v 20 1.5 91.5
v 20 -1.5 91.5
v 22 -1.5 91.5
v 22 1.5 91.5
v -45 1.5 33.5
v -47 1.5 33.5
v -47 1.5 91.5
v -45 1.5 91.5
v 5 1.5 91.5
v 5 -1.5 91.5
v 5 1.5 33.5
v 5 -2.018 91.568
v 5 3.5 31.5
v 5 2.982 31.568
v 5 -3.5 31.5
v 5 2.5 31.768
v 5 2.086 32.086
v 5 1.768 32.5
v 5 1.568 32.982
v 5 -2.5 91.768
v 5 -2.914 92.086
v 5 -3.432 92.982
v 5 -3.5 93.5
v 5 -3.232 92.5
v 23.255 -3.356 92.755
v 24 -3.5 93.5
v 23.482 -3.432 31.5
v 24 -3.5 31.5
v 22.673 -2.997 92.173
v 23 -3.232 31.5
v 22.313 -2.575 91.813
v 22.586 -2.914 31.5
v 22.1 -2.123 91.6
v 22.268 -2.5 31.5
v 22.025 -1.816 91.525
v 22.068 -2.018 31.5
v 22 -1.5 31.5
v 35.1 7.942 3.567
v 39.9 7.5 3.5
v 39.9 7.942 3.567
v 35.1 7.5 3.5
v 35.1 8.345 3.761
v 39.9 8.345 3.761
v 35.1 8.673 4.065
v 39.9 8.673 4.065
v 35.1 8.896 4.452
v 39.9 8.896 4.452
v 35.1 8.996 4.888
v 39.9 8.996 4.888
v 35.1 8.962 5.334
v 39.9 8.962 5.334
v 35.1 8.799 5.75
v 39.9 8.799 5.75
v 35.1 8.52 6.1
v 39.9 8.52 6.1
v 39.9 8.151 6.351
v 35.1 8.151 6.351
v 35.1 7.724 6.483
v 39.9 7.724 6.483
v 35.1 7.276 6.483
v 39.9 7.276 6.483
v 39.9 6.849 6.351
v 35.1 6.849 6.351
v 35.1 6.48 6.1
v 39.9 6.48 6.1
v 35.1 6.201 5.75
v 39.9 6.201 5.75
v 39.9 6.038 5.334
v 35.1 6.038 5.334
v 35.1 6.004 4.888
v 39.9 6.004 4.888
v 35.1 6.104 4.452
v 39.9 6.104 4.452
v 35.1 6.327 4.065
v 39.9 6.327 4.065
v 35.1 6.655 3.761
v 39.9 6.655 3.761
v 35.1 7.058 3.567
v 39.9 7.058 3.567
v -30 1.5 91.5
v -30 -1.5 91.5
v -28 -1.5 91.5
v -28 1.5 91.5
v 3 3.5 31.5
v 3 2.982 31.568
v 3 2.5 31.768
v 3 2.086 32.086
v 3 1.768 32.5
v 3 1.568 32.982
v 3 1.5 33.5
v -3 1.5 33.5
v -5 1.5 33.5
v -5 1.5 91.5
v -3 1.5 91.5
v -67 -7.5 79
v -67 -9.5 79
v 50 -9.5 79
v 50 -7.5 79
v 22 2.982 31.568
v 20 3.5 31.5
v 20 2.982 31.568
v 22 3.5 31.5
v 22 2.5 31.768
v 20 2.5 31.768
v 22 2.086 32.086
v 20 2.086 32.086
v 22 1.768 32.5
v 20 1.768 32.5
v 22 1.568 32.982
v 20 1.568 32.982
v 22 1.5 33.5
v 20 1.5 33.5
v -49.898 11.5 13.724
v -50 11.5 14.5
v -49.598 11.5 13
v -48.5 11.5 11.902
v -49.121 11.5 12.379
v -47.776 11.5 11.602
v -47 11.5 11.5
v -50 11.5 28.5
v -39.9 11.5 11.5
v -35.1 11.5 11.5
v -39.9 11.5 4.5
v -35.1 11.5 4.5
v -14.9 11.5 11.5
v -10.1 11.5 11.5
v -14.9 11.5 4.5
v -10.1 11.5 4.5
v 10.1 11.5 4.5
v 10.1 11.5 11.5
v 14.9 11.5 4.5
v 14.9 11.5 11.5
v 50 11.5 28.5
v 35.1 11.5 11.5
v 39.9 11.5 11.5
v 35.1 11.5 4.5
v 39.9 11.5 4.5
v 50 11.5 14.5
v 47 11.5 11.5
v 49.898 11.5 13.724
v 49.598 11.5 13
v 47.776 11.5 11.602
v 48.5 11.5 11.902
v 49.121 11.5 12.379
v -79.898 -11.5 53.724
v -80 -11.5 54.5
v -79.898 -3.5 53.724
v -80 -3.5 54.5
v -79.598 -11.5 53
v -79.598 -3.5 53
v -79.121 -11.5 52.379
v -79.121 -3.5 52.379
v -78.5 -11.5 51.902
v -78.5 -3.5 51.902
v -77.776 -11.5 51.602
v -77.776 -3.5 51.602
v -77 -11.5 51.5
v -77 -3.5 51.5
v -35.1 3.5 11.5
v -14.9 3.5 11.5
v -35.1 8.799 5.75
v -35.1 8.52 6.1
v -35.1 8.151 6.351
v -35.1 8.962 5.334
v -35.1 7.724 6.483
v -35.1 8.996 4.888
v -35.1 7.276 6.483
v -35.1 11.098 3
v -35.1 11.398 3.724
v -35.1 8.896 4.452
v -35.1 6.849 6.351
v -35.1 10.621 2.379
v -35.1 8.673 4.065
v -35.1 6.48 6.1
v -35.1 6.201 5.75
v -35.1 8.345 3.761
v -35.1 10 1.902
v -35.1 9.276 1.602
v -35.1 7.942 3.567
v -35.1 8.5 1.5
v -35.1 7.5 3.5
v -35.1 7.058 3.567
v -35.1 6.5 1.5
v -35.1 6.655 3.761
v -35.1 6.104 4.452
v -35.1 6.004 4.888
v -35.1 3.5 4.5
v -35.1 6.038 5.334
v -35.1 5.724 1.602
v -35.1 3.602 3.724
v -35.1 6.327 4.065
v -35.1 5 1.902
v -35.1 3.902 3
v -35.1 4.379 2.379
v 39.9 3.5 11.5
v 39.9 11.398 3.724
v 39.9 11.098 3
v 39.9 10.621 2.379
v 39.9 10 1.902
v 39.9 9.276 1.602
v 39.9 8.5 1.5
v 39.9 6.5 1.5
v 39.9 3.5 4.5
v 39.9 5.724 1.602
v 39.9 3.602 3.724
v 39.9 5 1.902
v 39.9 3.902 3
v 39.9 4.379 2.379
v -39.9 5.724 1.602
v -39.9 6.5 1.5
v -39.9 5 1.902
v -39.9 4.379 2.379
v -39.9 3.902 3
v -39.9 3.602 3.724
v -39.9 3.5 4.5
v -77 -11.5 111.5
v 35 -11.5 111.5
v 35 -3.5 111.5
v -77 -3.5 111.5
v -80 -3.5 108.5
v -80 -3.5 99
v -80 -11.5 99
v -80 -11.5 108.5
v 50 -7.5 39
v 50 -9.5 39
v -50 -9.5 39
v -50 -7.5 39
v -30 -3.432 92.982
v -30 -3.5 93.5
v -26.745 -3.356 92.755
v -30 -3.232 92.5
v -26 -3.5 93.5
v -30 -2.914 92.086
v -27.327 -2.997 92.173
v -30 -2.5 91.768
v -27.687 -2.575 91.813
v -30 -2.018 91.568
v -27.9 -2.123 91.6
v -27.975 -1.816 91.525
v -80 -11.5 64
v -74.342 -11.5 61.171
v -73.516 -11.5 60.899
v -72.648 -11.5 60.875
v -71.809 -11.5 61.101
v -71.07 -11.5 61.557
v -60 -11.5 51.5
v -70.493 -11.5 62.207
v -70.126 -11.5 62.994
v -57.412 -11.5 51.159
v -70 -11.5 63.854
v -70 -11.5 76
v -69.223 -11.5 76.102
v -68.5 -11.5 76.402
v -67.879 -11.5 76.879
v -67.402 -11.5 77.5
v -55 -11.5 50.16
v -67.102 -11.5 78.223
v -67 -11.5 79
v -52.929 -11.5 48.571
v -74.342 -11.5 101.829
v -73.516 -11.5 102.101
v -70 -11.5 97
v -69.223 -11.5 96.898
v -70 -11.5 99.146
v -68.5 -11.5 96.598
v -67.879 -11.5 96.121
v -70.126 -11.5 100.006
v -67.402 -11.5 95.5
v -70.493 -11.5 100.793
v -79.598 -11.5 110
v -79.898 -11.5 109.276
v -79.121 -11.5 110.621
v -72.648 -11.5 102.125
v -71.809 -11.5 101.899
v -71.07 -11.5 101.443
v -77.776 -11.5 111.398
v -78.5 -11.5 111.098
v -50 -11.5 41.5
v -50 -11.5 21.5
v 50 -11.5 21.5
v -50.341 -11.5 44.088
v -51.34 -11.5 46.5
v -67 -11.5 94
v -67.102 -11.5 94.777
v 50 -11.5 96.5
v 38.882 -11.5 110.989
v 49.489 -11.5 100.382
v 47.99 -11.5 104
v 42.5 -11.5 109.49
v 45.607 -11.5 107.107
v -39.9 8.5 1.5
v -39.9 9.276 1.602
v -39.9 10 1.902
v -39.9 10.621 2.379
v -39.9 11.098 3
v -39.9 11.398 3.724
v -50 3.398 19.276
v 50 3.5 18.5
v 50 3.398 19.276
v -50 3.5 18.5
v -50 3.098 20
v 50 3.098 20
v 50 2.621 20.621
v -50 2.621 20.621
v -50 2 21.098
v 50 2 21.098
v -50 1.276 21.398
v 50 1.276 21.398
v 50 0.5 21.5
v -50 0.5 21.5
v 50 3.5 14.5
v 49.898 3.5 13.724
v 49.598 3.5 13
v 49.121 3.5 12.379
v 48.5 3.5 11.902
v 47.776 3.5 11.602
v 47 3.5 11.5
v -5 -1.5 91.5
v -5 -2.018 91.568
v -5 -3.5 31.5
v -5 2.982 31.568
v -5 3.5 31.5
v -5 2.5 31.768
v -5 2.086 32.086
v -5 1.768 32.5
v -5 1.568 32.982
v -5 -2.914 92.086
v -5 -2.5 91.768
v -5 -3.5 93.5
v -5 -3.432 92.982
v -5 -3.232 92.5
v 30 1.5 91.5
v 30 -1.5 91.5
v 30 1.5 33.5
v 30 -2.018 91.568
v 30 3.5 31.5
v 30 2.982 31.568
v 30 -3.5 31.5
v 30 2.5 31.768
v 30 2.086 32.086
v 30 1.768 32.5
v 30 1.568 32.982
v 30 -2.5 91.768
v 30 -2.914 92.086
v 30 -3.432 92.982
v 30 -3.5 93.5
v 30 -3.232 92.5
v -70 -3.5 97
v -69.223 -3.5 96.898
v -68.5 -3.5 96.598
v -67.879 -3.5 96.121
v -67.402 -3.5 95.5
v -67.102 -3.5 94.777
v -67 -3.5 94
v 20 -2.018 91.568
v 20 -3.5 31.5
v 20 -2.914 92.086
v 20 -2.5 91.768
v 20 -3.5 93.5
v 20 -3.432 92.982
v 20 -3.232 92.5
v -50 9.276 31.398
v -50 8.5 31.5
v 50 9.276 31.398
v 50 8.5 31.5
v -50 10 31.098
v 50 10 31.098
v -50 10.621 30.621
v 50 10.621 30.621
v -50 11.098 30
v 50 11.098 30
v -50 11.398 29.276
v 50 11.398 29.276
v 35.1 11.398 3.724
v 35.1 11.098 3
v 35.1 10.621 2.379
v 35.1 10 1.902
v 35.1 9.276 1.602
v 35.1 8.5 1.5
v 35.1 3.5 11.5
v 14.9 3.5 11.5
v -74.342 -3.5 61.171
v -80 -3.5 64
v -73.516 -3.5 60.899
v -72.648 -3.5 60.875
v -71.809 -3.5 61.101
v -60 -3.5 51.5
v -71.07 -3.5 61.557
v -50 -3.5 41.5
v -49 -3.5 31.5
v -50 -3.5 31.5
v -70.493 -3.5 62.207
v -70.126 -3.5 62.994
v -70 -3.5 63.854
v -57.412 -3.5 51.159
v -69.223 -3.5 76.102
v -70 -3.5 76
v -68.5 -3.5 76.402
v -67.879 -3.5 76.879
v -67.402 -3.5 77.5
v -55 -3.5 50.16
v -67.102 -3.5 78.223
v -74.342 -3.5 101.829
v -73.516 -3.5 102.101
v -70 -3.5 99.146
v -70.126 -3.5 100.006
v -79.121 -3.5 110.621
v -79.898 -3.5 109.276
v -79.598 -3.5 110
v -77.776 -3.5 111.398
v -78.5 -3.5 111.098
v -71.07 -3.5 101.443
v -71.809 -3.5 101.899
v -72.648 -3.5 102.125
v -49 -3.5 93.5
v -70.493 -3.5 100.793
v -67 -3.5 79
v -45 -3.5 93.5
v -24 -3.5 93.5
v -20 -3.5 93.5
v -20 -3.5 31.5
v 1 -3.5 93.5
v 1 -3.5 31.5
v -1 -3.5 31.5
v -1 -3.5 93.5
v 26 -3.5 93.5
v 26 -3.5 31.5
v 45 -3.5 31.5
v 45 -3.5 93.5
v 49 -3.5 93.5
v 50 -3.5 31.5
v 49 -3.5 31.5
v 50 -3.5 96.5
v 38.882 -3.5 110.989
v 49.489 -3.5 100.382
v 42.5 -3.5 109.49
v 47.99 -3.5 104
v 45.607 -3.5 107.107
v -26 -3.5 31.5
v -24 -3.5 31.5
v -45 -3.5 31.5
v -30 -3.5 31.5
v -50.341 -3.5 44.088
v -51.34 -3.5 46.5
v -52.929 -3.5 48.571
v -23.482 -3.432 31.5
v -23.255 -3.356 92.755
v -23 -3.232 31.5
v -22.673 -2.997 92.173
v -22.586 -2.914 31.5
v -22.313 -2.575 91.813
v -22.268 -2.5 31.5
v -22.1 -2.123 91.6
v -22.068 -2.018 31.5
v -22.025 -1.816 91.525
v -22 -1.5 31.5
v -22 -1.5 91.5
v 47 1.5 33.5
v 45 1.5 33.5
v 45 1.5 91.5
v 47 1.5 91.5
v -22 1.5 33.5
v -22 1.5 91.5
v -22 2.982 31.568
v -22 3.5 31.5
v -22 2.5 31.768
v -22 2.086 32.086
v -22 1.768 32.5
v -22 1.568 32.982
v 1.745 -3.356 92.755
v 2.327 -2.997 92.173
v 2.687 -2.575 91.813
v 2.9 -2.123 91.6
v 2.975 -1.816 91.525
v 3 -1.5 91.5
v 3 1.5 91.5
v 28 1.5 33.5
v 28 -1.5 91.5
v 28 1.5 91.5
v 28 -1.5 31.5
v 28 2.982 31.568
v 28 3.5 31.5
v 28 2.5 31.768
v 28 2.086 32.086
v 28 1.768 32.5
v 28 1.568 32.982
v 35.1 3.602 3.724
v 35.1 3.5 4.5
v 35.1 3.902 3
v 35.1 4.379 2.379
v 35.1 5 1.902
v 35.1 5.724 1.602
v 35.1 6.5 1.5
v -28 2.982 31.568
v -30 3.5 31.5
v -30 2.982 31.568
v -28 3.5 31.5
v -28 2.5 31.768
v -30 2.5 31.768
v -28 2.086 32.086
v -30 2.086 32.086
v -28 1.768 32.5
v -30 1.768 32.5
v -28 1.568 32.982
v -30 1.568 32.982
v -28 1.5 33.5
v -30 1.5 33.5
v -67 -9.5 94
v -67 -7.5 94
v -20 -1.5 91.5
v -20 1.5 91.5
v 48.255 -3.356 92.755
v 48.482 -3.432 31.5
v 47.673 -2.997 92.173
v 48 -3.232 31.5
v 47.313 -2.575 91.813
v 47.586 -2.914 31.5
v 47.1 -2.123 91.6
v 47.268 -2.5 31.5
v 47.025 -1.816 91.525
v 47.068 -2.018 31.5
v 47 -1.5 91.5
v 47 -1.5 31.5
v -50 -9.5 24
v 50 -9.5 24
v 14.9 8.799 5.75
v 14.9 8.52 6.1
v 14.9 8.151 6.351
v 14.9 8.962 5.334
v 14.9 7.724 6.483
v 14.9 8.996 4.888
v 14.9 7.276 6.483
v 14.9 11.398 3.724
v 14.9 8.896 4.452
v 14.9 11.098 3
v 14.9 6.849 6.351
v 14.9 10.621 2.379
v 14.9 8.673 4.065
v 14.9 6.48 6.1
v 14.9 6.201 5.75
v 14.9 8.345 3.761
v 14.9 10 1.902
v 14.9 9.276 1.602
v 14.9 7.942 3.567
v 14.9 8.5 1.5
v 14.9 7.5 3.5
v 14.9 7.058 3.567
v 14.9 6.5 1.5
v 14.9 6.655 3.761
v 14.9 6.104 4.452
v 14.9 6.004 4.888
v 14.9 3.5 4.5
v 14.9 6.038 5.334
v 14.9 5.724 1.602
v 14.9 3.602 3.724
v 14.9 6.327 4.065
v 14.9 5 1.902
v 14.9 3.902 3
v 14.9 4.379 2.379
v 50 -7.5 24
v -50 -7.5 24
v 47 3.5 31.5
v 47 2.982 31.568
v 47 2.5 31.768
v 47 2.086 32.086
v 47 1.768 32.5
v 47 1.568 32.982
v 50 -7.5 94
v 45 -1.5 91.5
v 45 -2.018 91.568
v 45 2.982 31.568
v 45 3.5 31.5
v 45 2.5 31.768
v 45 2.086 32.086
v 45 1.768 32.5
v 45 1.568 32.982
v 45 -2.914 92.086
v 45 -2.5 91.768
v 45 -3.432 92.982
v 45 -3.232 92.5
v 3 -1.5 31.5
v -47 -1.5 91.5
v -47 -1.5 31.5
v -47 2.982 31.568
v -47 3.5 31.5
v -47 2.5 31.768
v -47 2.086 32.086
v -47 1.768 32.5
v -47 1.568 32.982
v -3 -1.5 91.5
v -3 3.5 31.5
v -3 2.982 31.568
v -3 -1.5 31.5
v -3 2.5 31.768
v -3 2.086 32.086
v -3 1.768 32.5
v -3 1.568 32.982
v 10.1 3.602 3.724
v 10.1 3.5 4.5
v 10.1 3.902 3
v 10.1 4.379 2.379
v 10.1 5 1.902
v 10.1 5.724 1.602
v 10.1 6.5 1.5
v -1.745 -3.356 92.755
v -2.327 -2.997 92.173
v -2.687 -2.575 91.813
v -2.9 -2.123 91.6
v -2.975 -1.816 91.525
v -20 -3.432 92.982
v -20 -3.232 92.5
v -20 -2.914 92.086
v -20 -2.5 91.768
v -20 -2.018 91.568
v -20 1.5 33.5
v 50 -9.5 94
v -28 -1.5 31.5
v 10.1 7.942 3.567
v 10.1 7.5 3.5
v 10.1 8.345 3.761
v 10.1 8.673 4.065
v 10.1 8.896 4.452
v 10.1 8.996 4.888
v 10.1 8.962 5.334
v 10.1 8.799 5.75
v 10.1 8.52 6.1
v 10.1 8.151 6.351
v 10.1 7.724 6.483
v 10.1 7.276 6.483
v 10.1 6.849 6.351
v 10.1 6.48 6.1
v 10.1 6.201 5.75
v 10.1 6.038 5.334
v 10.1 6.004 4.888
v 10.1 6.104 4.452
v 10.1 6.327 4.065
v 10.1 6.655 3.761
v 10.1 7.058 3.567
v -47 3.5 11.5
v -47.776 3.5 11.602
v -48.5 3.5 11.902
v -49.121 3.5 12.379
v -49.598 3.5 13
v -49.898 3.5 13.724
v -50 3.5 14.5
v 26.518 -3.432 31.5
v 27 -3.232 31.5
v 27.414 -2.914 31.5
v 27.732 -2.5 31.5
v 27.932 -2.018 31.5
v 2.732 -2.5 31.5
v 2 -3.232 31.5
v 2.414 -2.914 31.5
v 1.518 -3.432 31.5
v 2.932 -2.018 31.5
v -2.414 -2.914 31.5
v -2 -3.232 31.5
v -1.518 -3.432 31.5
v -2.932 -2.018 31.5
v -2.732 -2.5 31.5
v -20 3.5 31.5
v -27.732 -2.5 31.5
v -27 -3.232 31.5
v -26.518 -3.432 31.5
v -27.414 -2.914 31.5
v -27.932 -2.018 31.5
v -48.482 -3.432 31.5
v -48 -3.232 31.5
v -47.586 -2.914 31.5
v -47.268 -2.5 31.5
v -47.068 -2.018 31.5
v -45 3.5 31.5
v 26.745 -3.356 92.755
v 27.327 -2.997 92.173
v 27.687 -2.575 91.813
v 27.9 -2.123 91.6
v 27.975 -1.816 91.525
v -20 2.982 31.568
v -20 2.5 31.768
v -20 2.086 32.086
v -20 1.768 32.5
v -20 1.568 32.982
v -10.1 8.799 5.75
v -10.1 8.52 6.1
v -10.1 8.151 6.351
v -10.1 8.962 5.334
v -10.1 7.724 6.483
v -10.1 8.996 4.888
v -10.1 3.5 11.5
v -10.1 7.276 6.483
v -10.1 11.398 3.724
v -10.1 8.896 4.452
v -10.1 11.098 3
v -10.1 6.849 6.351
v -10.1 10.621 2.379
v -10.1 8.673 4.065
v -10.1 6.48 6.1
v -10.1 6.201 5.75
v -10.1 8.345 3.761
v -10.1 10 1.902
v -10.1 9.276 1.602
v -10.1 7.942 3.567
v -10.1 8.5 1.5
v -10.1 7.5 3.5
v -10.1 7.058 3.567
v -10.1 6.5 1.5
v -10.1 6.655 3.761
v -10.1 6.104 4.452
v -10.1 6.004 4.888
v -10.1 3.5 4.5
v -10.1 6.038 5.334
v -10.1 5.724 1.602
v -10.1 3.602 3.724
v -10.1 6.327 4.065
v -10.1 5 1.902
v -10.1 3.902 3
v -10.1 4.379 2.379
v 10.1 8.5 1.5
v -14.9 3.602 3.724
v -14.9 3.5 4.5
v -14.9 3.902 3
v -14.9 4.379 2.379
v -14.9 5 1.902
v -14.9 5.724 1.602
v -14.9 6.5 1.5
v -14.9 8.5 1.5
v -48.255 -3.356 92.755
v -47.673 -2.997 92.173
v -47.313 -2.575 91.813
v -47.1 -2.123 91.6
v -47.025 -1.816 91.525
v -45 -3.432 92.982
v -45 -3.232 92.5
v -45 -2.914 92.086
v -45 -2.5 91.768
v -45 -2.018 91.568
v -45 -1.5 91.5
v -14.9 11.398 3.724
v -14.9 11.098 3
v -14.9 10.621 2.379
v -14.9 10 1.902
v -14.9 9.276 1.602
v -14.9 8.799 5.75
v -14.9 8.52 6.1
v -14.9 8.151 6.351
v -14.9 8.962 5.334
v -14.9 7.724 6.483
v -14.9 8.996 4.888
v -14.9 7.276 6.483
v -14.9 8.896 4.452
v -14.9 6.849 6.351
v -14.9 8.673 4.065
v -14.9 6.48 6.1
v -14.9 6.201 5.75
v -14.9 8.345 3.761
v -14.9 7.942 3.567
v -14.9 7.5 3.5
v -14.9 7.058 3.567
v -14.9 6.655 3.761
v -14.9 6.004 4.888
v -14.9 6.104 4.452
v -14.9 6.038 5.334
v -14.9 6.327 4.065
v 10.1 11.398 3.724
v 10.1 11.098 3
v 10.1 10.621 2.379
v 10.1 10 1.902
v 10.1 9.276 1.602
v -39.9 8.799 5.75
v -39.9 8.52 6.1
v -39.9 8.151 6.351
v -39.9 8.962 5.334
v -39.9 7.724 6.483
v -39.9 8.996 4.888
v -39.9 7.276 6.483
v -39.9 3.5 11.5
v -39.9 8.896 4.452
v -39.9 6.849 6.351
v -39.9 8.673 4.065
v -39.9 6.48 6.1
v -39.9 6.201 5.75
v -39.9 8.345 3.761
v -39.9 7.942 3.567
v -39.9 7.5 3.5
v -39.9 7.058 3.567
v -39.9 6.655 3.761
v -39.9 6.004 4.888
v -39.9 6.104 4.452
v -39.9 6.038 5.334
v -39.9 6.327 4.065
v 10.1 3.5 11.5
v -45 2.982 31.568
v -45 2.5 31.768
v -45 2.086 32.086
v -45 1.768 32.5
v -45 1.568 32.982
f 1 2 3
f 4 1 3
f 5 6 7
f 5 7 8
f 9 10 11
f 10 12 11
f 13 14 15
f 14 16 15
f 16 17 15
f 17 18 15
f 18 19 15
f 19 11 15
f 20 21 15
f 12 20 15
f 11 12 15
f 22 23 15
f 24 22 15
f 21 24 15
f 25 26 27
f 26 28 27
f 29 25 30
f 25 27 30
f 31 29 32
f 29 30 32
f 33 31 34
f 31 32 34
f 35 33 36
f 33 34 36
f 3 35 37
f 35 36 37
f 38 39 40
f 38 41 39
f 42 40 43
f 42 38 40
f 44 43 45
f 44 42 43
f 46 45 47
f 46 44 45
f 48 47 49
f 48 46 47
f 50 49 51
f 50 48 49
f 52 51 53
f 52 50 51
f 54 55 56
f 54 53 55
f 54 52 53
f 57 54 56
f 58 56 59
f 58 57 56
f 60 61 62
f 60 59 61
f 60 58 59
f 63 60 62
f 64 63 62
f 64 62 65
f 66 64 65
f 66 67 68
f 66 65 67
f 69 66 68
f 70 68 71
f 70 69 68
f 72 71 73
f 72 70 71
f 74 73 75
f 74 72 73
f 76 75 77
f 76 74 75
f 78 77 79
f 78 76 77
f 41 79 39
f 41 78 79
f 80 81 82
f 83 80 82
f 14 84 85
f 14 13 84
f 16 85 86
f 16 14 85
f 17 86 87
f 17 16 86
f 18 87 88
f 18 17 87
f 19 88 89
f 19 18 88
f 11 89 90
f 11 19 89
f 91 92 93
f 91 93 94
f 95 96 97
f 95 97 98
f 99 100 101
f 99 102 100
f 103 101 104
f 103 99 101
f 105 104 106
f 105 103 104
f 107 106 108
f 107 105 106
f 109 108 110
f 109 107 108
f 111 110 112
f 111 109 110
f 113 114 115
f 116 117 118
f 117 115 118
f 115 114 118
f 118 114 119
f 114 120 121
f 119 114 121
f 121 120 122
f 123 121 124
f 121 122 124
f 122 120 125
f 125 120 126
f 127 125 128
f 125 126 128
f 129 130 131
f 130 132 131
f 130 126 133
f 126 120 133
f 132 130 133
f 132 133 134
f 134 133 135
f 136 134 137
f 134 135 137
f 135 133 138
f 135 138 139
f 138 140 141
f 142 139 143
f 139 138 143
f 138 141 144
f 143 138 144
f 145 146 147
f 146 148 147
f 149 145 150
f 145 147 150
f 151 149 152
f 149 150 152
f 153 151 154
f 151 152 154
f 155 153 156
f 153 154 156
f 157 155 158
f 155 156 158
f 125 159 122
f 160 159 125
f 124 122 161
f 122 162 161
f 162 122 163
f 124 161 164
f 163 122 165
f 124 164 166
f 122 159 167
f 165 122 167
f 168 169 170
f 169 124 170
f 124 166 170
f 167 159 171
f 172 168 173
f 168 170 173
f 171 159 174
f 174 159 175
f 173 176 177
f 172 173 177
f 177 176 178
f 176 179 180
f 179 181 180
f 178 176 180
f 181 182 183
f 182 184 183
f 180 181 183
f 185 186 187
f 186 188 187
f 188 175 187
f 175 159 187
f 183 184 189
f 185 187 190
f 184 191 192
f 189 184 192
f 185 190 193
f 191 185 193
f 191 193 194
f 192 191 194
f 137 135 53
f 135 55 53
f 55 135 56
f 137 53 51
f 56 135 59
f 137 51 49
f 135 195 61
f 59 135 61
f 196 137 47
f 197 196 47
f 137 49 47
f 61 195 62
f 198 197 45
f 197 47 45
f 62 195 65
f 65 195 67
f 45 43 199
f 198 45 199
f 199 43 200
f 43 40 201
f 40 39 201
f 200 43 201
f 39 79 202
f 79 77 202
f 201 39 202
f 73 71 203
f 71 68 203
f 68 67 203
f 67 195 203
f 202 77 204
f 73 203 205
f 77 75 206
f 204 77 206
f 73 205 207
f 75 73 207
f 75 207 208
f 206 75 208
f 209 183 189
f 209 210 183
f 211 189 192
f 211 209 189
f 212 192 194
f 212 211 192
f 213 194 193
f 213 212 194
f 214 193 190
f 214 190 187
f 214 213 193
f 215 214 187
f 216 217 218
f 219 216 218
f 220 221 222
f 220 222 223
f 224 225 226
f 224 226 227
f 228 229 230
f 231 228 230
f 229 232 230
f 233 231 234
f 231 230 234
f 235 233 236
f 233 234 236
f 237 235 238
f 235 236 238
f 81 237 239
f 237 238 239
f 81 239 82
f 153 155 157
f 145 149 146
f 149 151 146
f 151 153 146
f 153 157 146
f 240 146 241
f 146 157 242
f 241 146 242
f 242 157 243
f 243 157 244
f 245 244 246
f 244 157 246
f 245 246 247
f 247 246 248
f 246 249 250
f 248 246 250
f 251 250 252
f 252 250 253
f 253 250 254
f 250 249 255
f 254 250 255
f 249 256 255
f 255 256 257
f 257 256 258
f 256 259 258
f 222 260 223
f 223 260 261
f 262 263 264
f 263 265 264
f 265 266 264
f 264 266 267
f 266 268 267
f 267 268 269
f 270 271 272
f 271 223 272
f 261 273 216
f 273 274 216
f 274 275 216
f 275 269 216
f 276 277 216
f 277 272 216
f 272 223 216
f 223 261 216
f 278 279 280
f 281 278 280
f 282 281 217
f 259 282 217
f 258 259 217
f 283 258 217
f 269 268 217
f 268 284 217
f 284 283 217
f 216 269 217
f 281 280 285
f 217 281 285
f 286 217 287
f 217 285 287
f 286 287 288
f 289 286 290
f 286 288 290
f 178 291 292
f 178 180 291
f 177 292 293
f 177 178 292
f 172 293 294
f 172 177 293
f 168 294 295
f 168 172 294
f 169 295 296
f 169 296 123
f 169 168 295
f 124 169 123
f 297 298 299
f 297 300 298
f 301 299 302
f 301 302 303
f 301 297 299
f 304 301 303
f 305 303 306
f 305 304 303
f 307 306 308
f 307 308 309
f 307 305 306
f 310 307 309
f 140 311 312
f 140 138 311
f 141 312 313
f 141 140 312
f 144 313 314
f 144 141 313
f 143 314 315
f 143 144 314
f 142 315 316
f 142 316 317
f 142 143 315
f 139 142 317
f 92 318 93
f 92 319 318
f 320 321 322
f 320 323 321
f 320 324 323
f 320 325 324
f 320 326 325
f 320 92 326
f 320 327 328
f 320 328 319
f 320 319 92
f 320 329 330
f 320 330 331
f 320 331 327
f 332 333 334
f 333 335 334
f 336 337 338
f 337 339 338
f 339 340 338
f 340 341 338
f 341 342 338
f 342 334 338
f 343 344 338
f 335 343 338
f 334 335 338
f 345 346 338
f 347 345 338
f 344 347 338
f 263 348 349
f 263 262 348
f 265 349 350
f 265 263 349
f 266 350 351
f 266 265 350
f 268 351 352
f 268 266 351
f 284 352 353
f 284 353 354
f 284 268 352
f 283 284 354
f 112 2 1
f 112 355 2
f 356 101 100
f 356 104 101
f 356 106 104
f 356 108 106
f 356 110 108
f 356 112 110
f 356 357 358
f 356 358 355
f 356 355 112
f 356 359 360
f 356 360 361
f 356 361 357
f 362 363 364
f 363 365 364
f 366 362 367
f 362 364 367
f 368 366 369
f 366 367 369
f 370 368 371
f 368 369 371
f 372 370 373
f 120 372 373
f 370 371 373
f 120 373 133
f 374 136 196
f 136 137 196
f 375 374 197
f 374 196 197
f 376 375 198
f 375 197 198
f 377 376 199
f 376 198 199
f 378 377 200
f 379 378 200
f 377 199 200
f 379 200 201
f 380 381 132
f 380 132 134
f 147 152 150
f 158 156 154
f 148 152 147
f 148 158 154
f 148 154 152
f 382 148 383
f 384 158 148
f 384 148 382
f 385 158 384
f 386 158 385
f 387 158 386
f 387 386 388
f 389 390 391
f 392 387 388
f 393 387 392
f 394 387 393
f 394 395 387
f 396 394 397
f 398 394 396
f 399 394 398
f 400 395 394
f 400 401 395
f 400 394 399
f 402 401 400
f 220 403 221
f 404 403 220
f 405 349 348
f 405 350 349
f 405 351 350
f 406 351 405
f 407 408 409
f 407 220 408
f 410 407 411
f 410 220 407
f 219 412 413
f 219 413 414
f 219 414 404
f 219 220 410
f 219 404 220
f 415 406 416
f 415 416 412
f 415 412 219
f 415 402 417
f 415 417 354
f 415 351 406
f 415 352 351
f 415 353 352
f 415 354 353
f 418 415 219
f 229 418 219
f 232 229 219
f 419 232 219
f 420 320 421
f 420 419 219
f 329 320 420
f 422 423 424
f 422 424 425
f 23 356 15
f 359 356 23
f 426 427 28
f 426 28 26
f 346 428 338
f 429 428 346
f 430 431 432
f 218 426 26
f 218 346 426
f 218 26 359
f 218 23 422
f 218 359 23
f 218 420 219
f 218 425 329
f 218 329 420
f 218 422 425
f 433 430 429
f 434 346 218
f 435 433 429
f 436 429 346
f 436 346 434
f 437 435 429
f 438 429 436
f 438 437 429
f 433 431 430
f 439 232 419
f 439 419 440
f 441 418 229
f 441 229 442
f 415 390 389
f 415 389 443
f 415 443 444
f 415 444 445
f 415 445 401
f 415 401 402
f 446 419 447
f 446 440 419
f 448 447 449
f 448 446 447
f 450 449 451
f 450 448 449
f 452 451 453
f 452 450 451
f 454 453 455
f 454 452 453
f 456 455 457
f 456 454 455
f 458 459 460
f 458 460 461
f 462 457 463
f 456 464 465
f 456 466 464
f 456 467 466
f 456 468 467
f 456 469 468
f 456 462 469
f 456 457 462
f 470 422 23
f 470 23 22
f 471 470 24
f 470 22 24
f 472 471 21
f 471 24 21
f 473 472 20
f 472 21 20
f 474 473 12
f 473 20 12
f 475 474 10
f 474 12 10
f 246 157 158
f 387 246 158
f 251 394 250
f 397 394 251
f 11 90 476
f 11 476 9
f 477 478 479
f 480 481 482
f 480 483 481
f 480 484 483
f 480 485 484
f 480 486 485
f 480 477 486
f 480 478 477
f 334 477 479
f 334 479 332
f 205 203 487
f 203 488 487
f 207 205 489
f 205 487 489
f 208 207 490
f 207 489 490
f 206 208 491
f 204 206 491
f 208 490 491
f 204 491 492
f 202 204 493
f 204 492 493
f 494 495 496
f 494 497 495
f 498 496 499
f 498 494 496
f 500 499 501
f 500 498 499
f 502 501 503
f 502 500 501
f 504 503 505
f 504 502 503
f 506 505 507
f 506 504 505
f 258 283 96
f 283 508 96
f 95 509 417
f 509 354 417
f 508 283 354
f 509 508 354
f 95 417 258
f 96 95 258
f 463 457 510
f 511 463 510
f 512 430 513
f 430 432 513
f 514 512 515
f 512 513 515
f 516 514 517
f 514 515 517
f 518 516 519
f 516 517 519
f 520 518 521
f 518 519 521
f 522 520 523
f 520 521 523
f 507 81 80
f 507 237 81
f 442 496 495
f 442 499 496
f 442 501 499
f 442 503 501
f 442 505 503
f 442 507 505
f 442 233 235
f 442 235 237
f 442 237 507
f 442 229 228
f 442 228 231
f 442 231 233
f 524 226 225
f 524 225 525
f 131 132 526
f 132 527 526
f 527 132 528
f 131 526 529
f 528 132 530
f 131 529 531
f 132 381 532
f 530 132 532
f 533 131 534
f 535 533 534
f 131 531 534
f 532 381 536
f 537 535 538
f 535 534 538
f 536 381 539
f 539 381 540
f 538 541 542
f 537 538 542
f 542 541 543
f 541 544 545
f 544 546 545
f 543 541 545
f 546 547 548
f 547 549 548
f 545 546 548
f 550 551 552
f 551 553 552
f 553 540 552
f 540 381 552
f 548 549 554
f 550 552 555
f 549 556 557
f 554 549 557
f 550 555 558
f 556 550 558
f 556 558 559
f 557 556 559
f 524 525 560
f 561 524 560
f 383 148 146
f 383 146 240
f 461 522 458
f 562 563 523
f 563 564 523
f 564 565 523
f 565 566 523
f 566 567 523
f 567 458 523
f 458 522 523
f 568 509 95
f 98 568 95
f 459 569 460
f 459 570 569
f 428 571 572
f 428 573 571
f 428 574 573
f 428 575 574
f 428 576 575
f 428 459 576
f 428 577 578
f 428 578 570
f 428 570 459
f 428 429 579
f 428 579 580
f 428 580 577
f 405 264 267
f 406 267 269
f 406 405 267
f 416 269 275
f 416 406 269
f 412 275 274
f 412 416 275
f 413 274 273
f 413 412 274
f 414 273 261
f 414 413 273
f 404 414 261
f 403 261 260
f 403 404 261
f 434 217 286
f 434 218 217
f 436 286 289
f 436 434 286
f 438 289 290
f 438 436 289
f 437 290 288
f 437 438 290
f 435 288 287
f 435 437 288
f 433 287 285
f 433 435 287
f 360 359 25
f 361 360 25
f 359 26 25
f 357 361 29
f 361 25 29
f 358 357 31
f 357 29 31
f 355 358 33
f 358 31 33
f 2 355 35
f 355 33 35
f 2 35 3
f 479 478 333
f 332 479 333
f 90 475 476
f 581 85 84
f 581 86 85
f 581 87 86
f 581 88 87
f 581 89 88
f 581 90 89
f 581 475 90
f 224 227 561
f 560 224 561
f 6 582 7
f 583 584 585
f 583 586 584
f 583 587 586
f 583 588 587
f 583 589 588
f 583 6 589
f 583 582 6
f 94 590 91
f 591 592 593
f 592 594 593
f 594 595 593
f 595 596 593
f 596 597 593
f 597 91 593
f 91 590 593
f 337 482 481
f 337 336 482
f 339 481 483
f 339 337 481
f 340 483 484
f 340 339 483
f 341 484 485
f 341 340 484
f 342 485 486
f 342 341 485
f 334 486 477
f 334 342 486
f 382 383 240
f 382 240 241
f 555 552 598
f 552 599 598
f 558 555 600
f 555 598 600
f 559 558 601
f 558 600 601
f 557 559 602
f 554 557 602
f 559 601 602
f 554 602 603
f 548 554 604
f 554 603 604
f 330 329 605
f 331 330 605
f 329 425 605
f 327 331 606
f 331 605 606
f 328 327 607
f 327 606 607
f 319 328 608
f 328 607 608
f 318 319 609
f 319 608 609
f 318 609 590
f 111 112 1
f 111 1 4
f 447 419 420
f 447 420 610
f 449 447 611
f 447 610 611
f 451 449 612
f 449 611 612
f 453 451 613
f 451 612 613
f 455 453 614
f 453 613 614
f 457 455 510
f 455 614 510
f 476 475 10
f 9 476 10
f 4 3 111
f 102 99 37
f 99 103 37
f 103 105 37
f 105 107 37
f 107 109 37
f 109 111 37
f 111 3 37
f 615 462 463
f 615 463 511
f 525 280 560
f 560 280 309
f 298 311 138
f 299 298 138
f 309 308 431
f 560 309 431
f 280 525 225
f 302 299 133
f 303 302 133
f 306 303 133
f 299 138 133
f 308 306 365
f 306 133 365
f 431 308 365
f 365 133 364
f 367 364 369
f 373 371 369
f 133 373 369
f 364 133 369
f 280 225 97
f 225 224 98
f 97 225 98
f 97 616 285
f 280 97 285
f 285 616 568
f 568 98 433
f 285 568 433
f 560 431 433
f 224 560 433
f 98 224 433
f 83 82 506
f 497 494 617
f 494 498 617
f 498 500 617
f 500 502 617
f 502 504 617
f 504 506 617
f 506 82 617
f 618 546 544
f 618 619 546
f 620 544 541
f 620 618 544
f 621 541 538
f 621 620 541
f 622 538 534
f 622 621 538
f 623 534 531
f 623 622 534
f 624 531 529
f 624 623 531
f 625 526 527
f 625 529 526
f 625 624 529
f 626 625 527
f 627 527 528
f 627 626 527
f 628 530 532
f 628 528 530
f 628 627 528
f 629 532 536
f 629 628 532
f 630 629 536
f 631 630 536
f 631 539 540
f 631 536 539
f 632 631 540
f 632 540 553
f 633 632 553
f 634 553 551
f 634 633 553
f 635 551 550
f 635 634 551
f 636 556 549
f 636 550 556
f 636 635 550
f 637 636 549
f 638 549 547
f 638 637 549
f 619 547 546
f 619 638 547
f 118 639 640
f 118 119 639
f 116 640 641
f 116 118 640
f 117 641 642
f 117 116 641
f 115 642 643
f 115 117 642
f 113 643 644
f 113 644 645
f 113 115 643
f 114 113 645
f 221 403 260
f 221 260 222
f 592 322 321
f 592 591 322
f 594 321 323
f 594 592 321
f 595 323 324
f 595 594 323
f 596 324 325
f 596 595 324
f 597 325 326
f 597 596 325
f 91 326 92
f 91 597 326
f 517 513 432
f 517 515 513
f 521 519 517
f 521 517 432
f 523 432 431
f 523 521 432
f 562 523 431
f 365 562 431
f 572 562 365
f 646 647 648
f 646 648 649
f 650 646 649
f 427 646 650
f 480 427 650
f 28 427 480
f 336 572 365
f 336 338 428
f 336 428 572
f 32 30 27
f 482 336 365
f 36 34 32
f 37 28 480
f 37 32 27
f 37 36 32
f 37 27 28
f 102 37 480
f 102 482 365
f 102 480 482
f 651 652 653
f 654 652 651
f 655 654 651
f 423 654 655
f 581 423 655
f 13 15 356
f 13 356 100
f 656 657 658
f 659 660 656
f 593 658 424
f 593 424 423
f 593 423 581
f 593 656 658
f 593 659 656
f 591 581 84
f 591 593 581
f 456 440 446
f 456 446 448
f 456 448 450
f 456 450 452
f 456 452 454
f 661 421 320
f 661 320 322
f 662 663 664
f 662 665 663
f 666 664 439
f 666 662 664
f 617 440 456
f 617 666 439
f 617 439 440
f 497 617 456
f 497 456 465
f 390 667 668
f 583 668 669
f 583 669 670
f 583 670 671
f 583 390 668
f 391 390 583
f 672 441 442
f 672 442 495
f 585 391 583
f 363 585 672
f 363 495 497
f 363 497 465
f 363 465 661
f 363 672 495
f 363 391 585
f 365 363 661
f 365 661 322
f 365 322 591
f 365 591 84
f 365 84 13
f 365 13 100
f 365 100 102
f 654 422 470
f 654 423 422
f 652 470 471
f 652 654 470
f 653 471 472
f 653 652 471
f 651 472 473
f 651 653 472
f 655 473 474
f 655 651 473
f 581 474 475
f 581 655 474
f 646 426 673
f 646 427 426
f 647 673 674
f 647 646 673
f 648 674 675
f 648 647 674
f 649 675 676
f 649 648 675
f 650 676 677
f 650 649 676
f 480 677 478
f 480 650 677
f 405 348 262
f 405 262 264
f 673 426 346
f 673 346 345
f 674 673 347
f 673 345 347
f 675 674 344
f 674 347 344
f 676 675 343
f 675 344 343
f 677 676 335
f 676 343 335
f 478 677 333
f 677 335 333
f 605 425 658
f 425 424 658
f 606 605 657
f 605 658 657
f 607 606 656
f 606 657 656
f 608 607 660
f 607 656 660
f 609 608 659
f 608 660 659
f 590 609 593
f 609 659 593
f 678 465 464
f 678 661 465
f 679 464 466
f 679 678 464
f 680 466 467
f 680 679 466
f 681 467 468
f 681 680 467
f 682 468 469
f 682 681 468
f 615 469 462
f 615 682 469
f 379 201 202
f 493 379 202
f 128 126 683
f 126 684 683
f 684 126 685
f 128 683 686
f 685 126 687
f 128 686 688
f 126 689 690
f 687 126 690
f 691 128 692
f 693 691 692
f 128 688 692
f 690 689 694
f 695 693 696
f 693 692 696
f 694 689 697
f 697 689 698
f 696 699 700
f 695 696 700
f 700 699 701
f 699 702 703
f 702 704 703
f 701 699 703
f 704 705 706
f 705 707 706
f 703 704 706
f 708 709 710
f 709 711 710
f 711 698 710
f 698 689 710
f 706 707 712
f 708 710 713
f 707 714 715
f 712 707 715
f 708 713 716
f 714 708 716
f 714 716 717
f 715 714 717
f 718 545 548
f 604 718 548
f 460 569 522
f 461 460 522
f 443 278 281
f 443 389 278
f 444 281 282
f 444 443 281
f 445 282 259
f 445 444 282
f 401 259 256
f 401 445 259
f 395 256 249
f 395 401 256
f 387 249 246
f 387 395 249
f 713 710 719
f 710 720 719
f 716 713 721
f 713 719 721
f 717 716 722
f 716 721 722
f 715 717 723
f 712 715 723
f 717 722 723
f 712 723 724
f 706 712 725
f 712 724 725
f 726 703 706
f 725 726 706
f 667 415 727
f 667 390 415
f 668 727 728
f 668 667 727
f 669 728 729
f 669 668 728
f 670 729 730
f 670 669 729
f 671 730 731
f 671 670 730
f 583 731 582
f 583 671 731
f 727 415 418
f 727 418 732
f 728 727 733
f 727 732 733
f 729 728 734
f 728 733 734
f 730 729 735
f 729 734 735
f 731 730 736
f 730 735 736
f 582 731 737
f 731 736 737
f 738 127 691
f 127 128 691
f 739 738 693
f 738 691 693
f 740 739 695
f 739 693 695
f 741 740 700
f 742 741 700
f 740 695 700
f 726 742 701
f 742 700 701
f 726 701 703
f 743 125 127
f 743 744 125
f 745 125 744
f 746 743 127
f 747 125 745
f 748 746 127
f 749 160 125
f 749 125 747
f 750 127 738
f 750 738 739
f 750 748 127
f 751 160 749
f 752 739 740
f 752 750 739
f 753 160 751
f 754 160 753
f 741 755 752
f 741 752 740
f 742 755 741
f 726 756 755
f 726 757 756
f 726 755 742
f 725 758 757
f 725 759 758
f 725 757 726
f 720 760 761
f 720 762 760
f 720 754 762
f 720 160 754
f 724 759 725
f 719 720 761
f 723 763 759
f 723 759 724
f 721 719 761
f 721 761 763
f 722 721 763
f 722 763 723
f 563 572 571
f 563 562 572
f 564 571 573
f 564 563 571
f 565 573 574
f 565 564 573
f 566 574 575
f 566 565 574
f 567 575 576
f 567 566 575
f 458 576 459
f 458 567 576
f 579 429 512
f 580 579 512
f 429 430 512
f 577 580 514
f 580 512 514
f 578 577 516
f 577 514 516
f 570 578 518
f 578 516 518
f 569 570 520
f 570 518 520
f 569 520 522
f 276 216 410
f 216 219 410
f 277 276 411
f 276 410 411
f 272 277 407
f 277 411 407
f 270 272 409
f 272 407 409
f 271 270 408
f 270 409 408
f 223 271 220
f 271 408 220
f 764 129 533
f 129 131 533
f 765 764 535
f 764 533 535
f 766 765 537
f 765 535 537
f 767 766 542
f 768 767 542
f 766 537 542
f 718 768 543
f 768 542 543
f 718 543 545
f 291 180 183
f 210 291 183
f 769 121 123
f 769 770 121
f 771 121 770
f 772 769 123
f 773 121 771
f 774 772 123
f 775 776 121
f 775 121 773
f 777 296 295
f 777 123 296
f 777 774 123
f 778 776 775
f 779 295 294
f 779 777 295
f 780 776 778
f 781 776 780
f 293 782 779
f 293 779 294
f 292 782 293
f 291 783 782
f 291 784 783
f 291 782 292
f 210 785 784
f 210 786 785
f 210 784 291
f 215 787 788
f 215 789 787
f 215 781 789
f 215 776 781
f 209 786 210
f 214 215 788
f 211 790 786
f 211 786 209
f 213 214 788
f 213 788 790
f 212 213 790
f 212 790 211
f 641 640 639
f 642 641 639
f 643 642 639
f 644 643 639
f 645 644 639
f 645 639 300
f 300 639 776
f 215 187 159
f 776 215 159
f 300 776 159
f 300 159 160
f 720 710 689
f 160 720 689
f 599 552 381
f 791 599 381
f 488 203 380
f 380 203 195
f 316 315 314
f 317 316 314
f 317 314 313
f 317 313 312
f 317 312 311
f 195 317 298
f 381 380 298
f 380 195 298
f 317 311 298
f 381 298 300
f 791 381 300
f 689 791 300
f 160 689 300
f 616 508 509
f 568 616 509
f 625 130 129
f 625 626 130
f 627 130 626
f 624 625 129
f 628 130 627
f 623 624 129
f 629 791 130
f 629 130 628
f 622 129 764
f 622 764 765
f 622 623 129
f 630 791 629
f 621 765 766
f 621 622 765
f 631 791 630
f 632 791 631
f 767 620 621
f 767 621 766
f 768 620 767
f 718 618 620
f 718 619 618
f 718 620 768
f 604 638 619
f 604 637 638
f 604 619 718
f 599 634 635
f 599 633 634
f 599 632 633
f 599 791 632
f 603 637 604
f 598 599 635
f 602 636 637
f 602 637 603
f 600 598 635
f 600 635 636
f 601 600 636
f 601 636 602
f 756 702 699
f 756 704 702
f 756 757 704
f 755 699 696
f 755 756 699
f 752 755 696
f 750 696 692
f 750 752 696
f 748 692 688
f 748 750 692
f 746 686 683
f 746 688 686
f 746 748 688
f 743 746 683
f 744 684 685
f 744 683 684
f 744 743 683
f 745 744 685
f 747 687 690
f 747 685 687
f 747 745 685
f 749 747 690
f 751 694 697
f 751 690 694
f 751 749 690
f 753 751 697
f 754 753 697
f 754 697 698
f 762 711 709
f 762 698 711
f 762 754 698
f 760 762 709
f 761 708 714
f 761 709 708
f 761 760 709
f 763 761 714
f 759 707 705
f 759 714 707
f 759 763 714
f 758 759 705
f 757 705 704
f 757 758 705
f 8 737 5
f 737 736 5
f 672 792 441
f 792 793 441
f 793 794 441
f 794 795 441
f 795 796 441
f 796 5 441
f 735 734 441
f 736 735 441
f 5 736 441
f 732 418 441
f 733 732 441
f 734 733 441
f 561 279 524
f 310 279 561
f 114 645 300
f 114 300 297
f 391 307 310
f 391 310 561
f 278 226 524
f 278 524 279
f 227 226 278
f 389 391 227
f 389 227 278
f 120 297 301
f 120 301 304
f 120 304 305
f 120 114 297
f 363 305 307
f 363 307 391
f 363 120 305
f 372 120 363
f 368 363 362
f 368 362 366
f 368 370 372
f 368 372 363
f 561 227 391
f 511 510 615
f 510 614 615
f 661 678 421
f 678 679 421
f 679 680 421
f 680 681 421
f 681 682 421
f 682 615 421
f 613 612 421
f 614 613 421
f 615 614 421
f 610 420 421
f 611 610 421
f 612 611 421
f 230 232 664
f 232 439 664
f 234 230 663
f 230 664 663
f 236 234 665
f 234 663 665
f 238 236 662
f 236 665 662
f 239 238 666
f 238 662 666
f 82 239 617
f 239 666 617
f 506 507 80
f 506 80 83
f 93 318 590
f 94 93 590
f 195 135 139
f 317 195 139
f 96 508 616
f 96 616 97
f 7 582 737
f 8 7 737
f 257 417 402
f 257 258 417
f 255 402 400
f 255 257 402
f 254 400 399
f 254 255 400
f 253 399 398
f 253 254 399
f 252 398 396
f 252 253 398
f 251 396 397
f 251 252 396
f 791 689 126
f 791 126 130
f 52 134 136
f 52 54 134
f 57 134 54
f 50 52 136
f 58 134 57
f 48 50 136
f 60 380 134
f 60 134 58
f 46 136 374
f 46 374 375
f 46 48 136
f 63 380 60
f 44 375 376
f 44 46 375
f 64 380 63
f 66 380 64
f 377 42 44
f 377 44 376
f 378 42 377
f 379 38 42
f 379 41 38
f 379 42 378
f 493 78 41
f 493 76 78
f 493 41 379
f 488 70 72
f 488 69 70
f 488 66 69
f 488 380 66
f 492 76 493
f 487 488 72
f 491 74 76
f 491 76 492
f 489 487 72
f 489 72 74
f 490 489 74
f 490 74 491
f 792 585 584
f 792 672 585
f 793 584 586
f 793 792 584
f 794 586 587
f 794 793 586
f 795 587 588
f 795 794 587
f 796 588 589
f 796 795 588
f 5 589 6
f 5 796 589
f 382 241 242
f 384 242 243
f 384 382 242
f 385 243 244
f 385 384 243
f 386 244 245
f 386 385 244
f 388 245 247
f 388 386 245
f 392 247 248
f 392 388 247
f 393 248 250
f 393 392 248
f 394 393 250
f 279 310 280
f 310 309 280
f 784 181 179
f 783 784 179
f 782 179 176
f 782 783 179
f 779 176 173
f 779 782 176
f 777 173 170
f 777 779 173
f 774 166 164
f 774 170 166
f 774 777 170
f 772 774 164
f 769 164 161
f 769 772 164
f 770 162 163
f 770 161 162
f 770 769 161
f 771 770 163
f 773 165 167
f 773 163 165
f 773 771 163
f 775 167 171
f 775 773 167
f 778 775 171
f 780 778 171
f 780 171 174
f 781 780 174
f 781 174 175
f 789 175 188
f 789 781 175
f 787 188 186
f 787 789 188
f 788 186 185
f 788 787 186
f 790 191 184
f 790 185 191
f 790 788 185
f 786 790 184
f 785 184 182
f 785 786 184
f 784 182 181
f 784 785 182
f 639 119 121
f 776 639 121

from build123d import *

# Parameters (mm, degrees)
CROQUIS1_R                 = 1.5
SALIENTE_EXTRUIR1_DEPTH    = 50
CORTAR_EXTRUIR1_DEPTH      = 123.737524824
CORTAR_EXTRUIR1_DEPTH_BACK = 123.737524824
CROQUIS2_W                 = 10.1
CROQUIS2_H                 = 10
CROQUIS2_W_2               = 20.2
REDONDEO3_R                = 3
CROQUIS6_W                 = 80
CROQUIS6_H                 = 15
CORTAR_EXTRUIR5_DEPTH      = 151.214846137
CROQUIS29_W                = 2
CROQUIS29_H                = 60
SALIENTE_EXTRUIR16_DEPTH   = 5
REDONDEO17_R               = 2
CROQUIS19_W                = 60
CROQUIS19_H                = 8
SALIENTE_EXTRUIR10_DEPTH   = 30
REDONDEO12_R               = 15
REDONDEO15_R               = 3
REDONDEO23_R               = 10
CORTAR_EXTRUIR6_DEPTH      = 139.047998899
CORTAR_EXTRUIR4_DEPTH      = 138.71165528
CORTAR_EXTRUIR4_DEPTH_BACK = 138.71165528
CROQUIS4_W                 = 15
CROQUIS4_H                 = 2
REDONDEO24_R               = 3
CROQUIS31_W                = 3
CROQUIS31_H                = 21
CORTAR_EXTRUIR7_DEPTH      = 139.047998899
REDONDEO27_R               = 3


with BuildPart() as part:
    # Croquis1 → Saliente-Extruir1 (new, symmetric)
    with BuildSketch(Plane(origin=(0, 0, 0), x_dir=(0, 0, -1), z_dir=(1, 0, 0))):
        Polygon((-1.5, 11.5), (-1.5, 3.5), (-21.5, 3.5), (-21.5, -11.5), (-111.5, -11.5), (-111.5, 11.5), align=None)
        with Locations((-5, 7.5)):
            Circle(CROQUIS1_R, mode=Mode.SUBTRACT)
    extrude(amount=SALIENTE_EXTRUIR1_DEPTH, both=True)

    # Croquis2 → Cortar-Extruir1 (cut, two sides: drawn at the far end of the back side and taken through both)
    with BuildSketch(Plane(origin=(0, 0, 0), x_dir=(1, 0, 0), z_dir=(0, 1, 0)).offset(-CORTAR_EXTRUIR1_DEPTH_BACK)):
        with Locations((-44.95, -6.5)):
            Rectangle(CROQUIS2_W, CROQUIS2_H)
        with Locations((-25, -6.5)):
            Rectangle(CROQUIS2_W_2, CROQUIS2_H)
        with Locations((0, -6.5)):
            Rectangle(CROQUIS2_W_2, CROQUIS2_H)
        with Locations((25, -6.5)):
            Rectangle(CROQUIS2_W_2, CROQUIS2_H)
        with Locations((44.95, -6.5)):
            Rectangle(CROQUIS2_W, CROQUIS2_H)
    extrude(amount=CORTAR_EXTRUIR1_DEPTH + CORTAR_EXTRUIR1_DEPTH_BACK, mode=Mode.SUBTRACT)

    # Redondeo3
    redondeo3_edges = [part.edges().sort_by_distance(p)[0] for p in [
        (0, 3.5, 21.5),
        (37.5, 11.5, 1.5),
        (12.5, 11.5, 1.5),
        (-12.5, 11.5, 1.5),
        (-37.5, 11.5, 1.5),
        (37.5, 3.5, 1.5),
        (12.5, 3.5, 1.5),
        (-12.5, 3.5, 1.5),
        (-37.5, 3.5, 1.5),
        (-50, 7.5, 11.5),
        (50, 7.5, 11.5),
    ]]
    fillet(redondeo3_edges, radius=REDONDEO3_R)

    # Croquis6 → Cortar-Extruir5 (cut, through all)
    with BuildSketch(Plane.ZY.offset(50)):
        with Locations((71.5, 4)):
            Rectangle(CROQUIS6_W, CROQUIS6_H)
    extrude(amount=-CORTAR_EXTRUIR5_DEPTH, mode=Mode.SUBTRACT)

    # Croquis29 → Saliente-Extruir16 (add)
    with BuildSketch(Plane(origin=(0, -3.5, 0), x_dir=(1, 0, 0), z_dir=(0, 1, 0))):
        with Locations((-46, -61.5)):
            Rectangle(CROQUIS29_W, CROQUIS29_H)
        with Locations((-29, -61.5)):
            Rectangle(CROQUIS29_W, CROQUIS29_H)
        with Locations((-21, -61.5)):
            Rectangle(CROQUIS29_W, CROQUIS29_H)
        with Locations((-4, -61.5)):
            Rectangle(CROQUIS29_W, CROQUIS29_H)
        with Locations((4, -61.5)):
            Rectangle(CROQUIS29_W, CROQUIS29_H)
        with Locations((21, -61.5)):
            Rectangle(CROQUIS29_W, CROQUIS29_H)
        with Locations((29, -61.5)):
            Rectangle(CROQUIS29_W, CROQUIS29_H)
        with Locations((46, -61.5)):
            Rectangle(CROQUIS29_W, CROQUIS29_H)
    extrude(amount=SALIENTE_EXTRUIR16_DEPTH)

    # Redondeo17
    redondeo17_edges = [part.edges().sort_by_distance(p)[0] for p in [
        (-46, -3.5, 91.5),
        (-47, -3.5, 61.5),
        (-46, 1.5, 31.5),
        (-29, -3.5, 91.5),
        (-28, -3.5, 61.5),
        (-29, 1.5, 31.5),
        (-21, -3.5, 91.5),
        (-22, -3.5, 61.5),
        (-21, 1.5, 31.5),
        (-4, -3.5, 91.5),
        (-3, -3.5, 61.5),
        (-4, 1.5, 31.5),
        (4, -3.5, 91.5),
        (3, -3.5, 61.5),
        (4, 1.5, 31.5),
        (21, -3.5, 91.5),
        (22, -3.5, 61.5),
        (21, 1.5, 31.5),
        (29, -3.5, 91.5),
        (28, -3.5, 61.5),
        (29, 1.5, 31.5),
        (46, -3.5, 91.5),
        (47, -3.5, 61.5),
        (46, 1.5, 31.5),
    ]]
    fillet(redondeo17_edges, radius=REDONDEO17_R)

    # Croquis19 → Saliente-Extruir10 (add)
    with BuildSketch(Plane.ZY.offset(50)):
        with Locations((81.5, -7.5)):
            Rectangle(CROQUIS19_W, CROQUIS19_H)
    extrude(amount=SALIENTE_EXTRUIR10_DEPTH)

    # Redondeo12
    redondeo12_edges = [part.edges().sort_by_distance(p)[0] for p in [
        (50, -7.5, 111.5),
    ]]
    fillet(redondeo12_edges, radius=REDONDEO12_R)

    # Redondeo15
    redondeo15_edges = [part.edges().sort_by_distance(p)[0] for p in [
        (0, 11.5, 31.5),
    ]]
    fillet(redondeo15_edges, radius=REDONDEO15_R)

    # Redondeo23
    redondeo23_edges = [part.edges().sort_by_distance(p)[0] for p in [
        (-50, -7.5, 51.5),
    ]]
    fillet(redondeo23_edges, radius=REDONDEO23_R)

    # Croquis30 → Cortar-Extruir6 (cut, through all)
    with BuildSketch(Plane(origin=(0, -3.5, 0), x_dir=(1, 0, 0), z_dir=(0, 1, 0))):
        with BuildLine():
            Line((-80, -64), (-74.341640786, -61.170820393))
            ThreePointArc((-74.341640786, -61.170820393), (-71.422806664, -61.302149541), (-70, -63.854101966))
            Line((-70, -63.854101966), (-70, -99.145898034))
            ThreePointArc((-70, -99.145898034), (-71.422806664, -101.697850459), (-74.341640786, -101.829179607))
            Line((-74.341640786, -101.829179607), (-80, -99))
            Line((-80, -99), (-80, -64))
        make_face()
    extrude(amount=-CORTAR_EXTRUIR6_DEPTH, mode=Mode.SUBTRACT)

    # Croquis4 → Cortar-Extruir4 (cut, two sides: drawn at the far end of the back side and taken through both)
    with BuildSketch(Plane(origin=(0, 0, 0), x_dir=(0, 0, -1), z_dir=(1, 0, 0)).offset(-CORTAR_EXTRUIR4_DEPTH_BACK)):
        with Locations((-86.5, -8.5)):
            Rectangle(CROQUIS4_W, CROQUIS4_H)
        with Locations((-31.5, -8.5)):
            Rectangle(CROQUIS4_W, CROQUIS4_H)
    extrude(amount=CORTAR_EXTRUIR4_DEPTH + CORTAR_EXTRUIR4_DEPTH_BACK, mode=Mode.SUBTRACT)

    # Redondeo24
    redondeo24_edges = [part.edges().sort_by_distance(p)[0] for p in [
        (-80, -7.5, 111.5),
        (-80, -7.5, 51.5),
    ]]
    fillet(redondeo24_edges, radius=REDONDEO24_R)

    # Croquis31 → Cortar-Extruir7 (cut, through all)
    with BuildSketch(Plane(origin=(0, -3.5, 0), x_dir=(1, 0, 0), z_dir=(0, 1, 0))):
        with Locations((-68.5, -86.5)):
            Rectangle(CROQUIS31_W, CROQUIS31_H)
    extrude(amount=-CORTAR_EXTRUIR7_DEPTH, mode=Mode.SUBTRACT)

    # Redondeo27
    redondeo27_edges = [part.edges().sort_by_distance(p)[0] for p in [
        (-67, -7.5, 76),
        (-67, -7.5, 97),
    ]]
    fillet(redondeo27_edges, radius=REDONDEO27_R - 0.0001)  # a hair under: the kernel refuses the full size


solid = part.part
